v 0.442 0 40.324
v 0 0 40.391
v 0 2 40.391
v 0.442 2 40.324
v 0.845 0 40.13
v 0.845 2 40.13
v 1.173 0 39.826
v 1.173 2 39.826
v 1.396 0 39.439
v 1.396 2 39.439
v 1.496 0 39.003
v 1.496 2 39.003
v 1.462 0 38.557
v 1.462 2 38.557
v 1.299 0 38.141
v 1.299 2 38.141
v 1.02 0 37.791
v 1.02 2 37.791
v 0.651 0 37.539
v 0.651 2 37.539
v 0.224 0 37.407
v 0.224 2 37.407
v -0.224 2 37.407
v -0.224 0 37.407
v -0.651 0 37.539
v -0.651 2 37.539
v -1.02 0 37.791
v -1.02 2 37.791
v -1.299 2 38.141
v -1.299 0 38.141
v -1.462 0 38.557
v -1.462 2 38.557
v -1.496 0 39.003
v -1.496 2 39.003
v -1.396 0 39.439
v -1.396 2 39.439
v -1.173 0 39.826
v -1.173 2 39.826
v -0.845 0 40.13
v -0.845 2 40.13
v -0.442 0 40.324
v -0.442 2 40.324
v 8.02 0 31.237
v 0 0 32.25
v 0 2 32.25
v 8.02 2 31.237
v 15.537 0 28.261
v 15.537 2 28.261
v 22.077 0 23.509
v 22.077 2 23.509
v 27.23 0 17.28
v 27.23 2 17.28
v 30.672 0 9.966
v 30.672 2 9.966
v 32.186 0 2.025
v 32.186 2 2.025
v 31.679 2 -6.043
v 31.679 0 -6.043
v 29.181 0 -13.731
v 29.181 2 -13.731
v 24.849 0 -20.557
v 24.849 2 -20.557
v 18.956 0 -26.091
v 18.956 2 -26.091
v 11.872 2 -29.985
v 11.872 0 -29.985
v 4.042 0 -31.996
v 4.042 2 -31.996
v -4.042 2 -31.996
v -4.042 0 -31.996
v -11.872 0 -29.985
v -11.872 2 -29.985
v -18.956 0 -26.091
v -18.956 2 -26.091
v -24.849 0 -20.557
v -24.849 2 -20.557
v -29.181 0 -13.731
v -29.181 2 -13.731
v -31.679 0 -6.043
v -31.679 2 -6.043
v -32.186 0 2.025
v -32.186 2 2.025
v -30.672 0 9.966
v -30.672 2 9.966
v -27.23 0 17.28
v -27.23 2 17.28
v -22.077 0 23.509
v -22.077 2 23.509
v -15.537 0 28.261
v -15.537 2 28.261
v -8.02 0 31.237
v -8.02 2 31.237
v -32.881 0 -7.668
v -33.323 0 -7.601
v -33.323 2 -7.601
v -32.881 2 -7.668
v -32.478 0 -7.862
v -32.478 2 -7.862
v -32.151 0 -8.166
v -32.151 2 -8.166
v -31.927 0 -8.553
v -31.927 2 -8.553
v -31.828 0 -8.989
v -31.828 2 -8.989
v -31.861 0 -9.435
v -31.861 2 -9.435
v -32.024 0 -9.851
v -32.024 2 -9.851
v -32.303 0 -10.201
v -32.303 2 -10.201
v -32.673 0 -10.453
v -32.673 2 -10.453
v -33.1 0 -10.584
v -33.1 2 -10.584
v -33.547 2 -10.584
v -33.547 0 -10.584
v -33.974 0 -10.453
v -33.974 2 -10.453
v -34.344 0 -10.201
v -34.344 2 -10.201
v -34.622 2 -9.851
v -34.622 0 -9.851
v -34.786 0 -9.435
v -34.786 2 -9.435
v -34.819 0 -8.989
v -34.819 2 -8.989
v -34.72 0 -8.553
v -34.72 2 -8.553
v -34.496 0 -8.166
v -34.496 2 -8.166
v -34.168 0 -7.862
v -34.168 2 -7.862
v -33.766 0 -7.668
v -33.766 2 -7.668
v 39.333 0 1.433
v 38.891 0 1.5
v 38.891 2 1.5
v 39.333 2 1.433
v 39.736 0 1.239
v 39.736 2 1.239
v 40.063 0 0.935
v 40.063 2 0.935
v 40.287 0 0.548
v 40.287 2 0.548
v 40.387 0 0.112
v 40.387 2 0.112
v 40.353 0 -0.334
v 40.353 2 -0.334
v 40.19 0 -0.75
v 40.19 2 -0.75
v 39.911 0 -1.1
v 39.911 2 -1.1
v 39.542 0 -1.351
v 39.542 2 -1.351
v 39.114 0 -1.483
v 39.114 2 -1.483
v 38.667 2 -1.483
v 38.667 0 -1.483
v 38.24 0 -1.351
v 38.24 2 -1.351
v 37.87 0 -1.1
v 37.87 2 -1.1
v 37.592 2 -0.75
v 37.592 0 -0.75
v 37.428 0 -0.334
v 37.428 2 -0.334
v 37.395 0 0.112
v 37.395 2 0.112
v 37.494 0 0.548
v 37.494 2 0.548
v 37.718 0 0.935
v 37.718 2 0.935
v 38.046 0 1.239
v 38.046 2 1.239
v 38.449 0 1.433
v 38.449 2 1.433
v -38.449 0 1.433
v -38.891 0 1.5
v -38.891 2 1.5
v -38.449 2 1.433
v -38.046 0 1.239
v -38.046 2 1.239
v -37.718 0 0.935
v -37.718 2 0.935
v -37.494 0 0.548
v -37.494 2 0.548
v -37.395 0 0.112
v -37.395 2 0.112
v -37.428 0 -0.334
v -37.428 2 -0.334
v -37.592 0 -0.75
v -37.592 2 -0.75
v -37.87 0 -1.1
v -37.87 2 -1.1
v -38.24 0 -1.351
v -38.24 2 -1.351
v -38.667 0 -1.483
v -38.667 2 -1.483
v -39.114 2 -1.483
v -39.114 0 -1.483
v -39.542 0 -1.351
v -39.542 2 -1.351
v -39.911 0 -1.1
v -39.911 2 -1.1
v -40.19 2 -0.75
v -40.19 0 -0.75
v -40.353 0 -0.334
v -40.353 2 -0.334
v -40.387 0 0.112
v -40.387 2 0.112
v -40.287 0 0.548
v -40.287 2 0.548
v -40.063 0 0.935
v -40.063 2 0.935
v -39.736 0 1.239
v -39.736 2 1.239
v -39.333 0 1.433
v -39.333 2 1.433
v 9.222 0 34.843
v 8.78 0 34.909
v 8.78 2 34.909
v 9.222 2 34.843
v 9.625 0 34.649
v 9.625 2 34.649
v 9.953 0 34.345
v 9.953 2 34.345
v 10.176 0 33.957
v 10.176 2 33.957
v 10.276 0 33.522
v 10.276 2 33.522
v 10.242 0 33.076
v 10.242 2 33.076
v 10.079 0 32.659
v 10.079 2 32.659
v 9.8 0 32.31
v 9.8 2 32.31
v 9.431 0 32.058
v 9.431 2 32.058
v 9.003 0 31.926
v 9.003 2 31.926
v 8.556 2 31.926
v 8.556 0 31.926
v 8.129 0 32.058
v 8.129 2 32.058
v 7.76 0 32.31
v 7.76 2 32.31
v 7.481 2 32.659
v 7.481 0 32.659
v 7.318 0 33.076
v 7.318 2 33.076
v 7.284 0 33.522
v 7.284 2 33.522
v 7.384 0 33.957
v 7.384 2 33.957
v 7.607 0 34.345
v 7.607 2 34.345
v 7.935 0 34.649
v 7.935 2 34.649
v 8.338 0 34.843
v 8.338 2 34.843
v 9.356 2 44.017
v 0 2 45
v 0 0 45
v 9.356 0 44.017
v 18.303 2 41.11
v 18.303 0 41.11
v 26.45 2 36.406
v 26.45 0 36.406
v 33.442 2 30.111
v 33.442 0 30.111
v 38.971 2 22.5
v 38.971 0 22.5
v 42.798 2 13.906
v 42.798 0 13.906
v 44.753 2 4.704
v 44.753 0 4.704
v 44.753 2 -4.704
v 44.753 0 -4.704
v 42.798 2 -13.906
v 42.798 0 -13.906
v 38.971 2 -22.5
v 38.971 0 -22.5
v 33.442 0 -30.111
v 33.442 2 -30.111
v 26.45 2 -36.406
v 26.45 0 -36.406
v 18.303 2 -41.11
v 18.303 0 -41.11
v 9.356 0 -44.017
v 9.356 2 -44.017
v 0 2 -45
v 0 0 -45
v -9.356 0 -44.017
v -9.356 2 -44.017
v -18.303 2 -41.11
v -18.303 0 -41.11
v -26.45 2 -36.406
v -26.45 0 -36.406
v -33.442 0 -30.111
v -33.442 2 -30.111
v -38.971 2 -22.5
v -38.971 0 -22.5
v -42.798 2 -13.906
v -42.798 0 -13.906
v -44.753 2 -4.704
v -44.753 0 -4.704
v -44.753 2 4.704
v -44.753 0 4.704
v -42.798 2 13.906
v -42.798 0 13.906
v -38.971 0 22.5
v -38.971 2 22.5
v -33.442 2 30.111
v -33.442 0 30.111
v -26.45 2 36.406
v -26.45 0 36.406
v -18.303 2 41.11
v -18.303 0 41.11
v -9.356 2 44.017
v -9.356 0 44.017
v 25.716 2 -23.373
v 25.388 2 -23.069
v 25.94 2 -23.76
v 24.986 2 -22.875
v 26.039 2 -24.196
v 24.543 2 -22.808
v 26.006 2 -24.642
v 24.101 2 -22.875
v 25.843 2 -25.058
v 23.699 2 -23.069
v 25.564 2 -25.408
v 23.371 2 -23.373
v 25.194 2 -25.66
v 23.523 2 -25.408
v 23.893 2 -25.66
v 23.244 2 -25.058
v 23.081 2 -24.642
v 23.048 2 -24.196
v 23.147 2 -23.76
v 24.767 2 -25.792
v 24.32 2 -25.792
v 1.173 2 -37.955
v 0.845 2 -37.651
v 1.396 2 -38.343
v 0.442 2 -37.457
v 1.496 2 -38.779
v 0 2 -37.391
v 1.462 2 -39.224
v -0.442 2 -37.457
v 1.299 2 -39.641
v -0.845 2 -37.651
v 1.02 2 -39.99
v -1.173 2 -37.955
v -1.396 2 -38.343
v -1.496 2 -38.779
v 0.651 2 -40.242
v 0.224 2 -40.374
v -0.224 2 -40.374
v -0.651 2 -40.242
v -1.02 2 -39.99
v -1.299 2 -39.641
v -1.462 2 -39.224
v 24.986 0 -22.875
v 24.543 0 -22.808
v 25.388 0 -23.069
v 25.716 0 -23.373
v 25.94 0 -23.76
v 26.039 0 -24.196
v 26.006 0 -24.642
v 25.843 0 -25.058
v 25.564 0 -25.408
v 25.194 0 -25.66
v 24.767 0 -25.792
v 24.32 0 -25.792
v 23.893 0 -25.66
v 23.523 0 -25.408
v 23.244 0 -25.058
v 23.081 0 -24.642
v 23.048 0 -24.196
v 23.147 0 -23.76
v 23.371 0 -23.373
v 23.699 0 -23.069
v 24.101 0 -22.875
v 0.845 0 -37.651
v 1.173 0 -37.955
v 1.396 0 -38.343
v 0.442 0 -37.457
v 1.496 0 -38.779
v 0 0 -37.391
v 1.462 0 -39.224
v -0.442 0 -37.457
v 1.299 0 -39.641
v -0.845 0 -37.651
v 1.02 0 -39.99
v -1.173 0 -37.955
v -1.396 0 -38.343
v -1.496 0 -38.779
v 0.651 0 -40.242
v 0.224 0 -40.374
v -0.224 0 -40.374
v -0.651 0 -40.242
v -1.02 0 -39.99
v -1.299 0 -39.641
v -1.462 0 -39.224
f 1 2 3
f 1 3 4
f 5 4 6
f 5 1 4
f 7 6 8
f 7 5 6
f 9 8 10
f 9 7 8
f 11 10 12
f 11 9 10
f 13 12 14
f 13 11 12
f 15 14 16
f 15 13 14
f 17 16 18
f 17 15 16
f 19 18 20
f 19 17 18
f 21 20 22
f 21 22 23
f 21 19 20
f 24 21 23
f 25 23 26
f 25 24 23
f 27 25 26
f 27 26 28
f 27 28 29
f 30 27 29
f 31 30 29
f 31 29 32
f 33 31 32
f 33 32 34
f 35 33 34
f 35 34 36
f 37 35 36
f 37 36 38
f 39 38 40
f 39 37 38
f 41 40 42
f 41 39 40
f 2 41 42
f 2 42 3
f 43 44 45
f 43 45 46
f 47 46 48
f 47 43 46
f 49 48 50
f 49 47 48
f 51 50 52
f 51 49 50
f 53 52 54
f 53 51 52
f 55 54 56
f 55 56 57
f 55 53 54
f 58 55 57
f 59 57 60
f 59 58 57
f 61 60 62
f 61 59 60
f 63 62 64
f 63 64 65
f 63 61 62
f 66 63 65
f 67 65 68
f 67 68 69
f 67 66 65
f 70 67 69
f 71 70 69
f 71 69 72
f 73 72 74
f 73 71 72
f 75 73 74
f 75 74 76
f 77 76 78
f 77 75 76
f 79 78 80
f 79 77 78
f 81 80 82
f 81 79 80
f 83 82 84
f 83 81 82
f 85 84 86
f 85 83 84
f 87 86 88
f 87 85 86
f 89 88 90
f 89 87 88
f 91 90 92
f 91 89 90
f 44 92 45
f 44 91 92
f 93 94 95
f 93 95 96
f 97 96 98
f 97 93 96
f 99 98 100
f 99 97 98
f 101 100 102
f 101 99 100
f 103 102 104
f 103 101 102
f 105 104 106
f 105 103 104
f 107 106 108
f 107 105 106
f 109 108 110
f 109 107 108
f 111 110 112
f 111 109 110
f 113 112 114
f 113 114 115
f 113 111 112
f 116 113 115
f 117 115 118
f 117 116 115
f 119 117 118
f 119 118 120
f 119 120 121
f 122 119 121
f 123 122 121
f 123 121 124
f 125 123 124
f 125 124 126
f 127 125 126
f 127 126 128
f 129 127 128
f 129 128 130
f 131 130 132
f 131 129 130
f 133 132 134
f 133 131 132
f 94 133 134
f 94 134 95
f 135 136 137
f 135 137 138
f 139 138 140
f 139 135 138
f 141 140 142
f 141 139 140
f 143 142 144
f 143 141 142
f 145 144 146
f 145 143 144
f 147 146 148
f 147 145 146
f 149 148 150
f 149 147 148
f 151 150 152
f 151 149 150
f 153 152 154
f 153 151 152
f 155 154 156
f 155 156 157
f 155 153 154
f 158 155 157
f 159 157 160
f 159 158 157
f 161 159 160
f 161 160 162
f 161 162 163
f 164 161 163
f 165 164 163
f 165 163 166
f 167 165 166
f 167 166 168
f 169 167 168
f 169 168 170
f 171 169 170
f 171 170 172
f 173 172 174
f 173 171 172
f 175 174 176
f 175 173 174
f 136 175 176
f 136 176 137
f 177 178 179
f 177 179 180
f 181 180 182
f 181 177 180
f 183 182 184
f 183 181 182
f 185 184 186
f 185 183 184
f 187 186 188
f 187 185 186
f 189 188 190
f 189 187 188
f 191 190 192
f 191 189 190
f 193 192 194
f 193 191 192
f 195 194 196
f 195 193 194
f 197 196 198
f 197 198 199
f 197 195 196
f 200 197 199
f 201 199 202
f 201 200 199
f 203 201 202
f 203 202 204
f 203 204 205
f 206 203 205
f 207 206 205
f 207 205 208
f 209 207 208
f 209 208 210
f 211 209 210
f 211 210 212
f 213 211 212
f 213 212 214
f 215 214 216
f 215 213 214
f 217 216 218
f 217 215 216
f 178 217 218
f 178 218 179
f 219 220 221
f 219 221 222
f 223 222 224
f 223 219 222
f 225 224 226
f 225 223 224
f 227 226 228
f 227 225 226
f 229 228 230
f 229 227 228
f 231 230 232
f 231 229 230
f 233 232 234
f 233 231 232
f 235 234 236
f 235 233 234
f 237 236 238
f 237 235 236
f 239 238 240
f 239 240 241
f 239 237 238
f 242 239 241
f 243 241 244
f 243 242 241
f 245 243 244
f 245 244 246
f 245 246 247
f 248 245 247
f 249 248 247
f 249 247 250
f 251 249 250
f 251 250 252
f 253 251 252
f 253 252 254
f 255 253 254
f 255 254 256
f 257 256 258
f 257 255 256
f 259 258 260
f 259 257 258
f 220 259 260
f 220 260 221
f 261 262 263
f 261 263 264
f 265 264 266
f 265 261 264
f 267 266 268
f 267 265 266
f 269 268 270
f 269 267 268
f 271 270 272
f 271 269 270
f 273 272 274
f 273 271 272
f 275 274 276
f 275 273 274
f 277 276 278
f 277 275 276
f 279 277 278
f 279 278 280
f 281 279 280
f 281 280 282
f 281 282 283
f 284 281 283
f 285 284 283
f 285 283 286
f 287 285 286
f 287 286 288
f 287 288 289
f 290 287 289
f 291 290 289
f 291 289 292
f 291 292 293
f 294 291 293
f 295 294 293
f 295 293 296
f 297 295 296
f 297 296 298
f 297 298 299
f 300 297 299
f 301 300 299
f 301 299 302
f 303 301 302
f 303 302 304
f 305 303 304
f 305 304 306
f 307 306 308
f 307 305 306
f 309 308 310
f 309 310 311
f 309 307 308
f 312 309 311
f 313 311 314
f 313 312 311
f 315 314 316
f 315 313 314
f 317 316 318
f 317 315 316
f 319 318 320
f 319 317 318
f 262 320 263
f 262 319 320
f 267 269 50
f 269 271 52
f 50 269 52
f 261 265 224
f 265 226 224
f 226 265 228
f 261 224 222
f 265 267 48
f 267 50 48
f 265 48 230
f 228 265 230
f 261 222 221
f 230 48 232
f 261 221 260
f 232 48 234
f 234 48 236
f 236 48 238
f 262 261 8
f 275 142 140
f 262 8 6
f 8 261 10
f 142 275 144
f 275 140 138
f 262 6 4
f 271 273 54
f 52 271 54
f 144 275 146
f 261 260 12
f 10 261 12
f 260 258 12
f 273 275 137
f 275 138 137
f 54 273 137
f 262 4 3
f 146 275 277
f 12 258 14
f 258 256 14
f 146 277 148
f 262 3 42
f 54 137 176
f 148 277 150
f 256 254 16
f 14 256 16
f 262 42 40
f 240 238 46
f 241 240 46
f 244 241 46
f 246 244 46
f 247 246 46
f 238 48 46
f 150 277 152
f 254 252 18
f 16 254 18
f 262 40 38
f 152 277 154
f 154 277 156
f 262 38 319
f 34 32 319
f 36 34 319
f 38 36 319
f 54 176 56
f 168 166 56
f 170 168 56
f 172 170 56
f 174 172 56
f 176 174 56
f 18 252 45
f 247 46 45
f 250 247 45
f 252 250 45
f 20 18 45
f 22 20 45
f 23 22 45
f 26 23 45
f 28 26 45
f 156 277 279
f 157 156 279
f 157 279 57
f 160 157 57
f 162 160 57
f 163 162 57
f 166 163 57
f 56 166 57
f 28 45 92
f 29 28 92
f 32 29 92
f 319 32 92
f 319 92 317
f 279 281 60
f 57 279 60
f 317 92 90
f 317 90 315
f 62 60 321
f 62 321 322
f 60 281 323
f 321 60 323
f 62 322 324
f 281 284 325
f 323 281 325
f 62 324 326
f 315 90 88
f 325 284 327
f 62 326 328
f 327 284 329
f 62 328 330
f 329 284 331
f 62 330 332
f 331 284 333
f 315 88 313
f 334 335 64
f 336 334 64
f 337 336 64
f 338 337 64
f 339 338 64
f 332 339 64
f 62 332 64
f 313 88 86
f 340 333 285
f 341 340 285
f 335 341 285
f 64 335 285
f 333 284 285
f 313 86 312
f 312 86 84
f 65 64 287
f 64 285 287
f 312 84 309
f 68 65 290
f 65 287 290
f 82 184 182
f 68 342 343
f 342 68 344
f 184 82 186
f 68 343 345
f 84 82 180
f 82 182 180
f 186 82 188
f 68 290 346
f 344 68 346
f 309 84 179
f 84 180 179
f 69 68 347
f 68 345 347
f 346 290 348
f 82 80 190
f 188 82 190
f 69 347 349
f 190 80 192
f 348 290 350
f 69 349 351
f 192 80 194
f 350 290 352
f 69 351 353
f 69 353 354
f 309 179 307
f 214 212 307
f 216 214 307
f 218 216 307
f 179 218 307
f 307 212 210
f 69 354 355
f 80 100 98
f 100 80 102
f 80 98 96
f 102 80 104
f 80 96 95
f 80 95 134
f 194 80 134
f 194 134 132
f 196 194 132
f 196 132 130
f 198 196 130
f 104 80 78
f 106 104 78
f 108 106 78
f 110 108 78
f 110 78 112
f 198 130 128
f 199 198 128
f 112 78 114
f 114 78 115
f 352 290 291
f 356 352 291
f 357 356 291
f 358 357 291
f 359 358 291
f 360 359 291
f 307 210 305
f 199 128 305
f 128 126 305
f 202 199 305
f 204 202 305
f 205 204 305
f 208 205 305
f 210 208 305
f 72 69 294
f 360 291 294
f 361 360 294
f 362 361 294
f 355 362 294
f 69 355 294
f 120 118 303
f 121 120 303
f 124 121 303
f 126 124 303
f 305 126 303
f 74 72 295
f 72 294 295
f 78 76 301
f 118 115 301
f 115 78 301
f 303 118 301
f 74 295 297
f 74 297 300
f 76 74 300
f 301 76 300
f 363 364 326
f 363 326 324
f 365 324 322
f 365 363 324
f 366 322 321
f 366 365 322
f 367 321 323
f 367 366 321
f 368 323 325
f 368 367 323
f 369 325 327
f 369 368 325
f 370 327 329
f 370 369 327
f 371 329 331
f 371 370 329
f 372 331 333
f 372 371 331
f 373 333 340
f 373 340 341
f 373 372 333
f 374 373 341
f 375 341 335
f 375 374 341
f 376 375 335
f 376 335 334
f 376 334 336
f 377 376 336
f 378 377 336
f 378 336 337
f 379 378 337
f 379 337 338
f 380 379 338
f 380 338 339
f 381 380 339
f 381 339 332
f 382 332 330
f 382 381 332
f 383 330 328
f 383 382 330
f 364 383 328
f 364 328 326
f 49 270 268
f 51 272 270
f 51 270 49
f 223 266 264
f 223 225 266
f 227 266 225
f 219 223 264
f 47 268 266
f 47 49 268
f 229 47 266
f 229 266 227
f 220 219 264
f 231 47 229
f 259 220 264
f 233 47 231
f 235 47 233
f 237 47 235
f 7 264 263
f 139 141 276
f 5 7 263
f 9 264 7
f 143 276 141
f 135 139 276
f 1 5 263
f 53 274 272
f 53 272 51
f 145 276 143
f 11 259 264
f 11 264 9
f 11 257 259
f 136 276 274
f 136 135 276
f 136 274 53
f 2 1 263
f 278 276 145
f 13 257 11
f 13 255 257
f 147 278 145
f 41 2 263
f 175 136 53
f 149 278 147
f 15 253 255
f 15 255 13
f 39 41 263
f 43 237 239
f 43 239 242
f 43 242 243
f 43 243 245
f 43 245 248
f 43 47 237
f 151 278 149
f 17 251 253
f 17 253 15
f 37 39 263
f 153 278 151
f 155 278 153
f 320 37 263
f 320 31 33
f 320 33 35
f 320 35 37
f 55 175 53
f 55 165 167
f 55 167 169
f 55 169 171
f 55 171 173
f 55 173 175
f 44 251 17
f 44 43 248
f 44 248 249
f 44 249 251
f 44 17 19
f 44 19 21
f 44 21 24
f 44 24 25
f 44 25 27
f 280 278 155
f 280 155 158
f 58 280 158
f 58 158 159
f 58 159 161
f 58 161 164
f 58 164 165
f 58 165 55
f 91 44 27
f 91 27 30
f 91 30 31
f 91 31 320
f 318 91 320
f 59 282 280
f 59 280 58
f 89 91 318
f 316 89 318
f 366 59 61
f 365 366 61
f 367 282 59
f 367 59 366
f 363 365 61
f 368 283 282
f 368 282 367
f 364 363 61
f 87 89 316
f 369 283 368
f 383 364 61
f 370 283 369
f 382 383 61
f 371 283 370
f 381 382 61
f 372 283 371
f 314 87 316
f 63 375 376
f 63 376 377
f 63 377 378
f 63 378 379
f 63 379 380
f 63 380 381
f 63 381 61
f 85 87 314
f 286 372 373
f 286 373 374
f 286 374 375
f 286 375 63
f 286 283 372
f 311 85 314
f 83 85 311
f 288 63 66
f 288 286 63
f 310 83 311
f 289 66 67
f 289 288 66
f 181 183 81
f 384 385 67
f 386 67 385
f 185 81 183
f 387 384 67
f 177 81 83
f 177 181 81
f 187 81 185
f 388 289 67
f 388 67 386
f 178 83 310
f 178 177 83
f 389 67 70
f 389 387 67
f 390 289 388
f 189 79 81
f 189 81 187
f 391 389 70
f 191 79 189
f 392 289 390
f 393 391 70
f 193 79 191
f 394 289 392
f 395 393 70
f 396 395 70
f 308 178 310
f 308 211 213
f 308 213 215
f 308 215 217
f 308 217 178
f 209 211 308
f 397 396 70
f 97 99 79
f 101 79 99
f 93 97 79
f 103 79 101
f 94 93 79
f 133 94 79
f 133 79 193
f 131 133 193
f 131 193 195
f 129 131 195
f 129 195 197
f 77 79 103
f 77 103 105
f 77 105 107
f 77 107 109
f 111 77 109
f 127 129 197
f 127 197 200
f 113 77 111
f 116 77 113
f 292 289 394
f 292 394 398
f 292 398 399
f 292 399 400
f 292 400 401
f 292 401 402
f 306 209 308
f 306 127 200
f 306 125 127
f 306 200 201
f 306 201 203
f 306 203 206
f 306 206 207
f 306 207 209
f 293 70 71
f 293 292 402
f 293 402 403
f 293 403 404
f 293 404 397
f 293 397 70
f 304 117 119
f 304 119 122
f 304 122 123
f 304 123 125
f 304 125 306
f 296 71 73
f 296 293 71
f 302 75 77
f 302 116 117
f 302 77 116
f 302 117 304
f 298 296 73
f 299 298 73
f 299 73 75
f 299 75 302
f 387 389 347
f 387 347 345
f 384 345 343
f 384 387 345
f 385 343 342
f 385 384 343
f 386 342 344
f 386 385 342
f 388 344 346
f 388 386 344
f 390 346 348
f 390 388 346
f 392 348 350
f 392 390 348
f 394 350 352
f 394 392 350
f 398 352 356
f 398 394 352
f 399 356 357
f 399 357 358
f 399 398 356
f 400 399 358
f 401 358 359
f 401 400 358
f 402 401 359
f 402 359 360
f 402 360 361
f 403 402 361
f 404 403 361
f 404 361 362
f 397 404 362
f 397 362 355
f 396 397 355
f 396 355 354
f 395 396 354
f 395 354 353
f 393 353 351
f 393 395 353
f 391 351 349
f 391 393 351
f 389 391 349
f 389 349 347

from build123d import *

# Parameters (mm, degrees)
SKETCH2_R           = 1.5
SKETCH2_R_2         = 32.25
BOSS_EXTRUDE1_DEPTH = 2
SKETCH3_R           = 45
CUT_EXTRUDE1_DEPTH  = 74.566296631


with BuildPart() as part:
    # Sketch2 → Boss-Extrude1 (new body)
    with BuildSketch(Plane(origin=(0, 0, 0), x_dir=(1, 0, 0), z_dir=(0, 1, 0))):
        with BuildLine():
            Line((17.897079586, 48.929734976), (40.149284407, 43.651218265))
            ThreePointArc((40.149284407, 43.651218265), (42.540265174, 42.312242187), (43.866371506, 39.91409958))
            Line((43.866371506, 39.91409958), (49.02521675, 17.633846579))
            ThreePointArc((49.02521675, 17.633846579), (49.23478351, 16.809026698), (49.479249782, 15.993868858))
            ThreePointArc((49.479249782, 15.993868858), (51.999812242, -0.139738387), (49.392575566, -16.259565766))
            ThreePointArc((49.392575566, -16.259565766), (49.143731732, -17.073397941), (48.929734976, -17.897079586))
            Line((48.929734976, -17.897079586), (43.651218265, -40.149284407))
            ThreePointArc((43.651218265, -40.149284407), (42.312242187, -42.540265174), (39.91409958, -43.866371506))
            Line((39.91409958, -43.866371506), (17.633846579, -49.02521675))
            ThreePointArc((17.633846579, -49.02521675), (16.809026698, -49.23478351), (15.993868858, -49.479249782))
            ThreePointArc((15.993868858, -49.479249782), (-0.139738387, -51.999812242), (-16.259565766, -49.392575566))
            ThreePointArc((-16.259565766, -49.392575566), (-17.073397941, -49.143731732), (-17.897079586, -48.929734976))
            Line((-17.897079586, -48.929734976), (-40.149284407, -43.651218265))
            ThreePointArc((-40.149284407, -43.651218265), (-42.540265174, -42.312242187), (-43.866371506, -39.91409958))
            Line((-43.866371506, -39.91409958), (-49.02521675, -17.633846579))
            ThreePointArc((-49.02521675, -17.633846579), (-49.23478351, -16.809026698), (-49.479249782, -15.993868858))
            ThreePointArc((-49.479249782, -15.993868858), (-51.999812242, 0.139738387), (-49.392575566, 16.259565766))
            ThreePointArc((-49.392575566, 16.259565766), (-49.143731732, 17.073397941), (-48.929734976, 17.897079586))
            Line((-48.929734976, 17.897079586), (-43.651218265, 40.149284407))
            ThreePointArc((-43.651218265, 40.149284407), (-42.312242187, 42.540265174), (-39.91409958, 43.866371506))
            Line((-39.91409958, 43.866371506), (-17.633846579, 49.02521675))
            ThreePointArc((-17.633846579, 49.02521675), (-16.809026698, 49.23478351), (-15.993868858, 49.479249782))
            ThreePointArc((-15.993868858, 49.479249782), (-8.026622704, 51.3767781), (0.139738387, 51.999812242))
            ThreePointArc((0.139738387, 51.999812242), (8.302633013, 51.332896714), (16.259565766, 49.392575566))
            ThreePointArc((16.259565766, 49.392575566), (17.073397941, 49.143731732), (17.897079586, 48.929734976))
        make_face()
        with Locations(Location((-38.8907, 38.8907, 0), (0, 0, 270))):
            Circle(SKETCH2_R, mode=Mode.SUBTRACT)
        with Locations(Location((38.8907, 38.8907, 0), (0, 0, 90))):
            Circle(SKETCH2_R, mode=Mode.SUBTRACT)
        with Locations(Location((38.8907, -38.8907, 0), (0, 0, 270))):
            Circle(SKETCH2_R, mode=Mode.SUBTRACT)
        with Locations(Location((-38.8907, -38.8907, 0), (0, 0, 90))):
            Circle(SKETCH2_R, mode=Mode.SUBTRACT)
        with Locations(Location((-33.323403491, 9.101105168, 0), (0, 0, 270))):
            Circle(SKETCH2_R, mode=Mode.SUBTRACT)
        with Locations(Location((24.543490023, 24.30836138, 0), (0, 0, 270))):
            Circle(SKETCH2_R, mode=Mode.SUBTRACT)
        with Locations(Location((8.779913467, -33.409466548, 0), (0, 0, 270))):
            Circle(SKETCH2_R, mode=Mode.SUBTRACT)
        with Locations(Location((0, 0, 0), (0, 0, 270))):
            Circle(SKETCH2_R_2, mode=Mode.SUBTRACT)
        with Locations(Location((0, 38.8907, 0), (0, 0, 270))):
            Circle(SKETCH2_R, mode=Mode.SUBTRACT)
        with Locations(Location((38.8907, 0, 0), (0, 0, 270))):
            Circle(SKETCH2_R, mode=Mode.SUBTRACT)
        with Locations(Location((0, -38.8907, 0), (0, 0, 270))):
            Circle(SKETCH2_R, mode=Mode.SUBTRACT)
        with Locations(Location((-38.8907, 0, 0), (0, 0, 270))):
            Circle(SKETCH2_R, mode=Mode.SUBTRACT)
    extrude(amount=BOSS_EXTRUDE1_DEPTH)

    # Sketch3 → Cut-Extrude1 (cut, through all)
    with BuildSketch(Plane(origin=(0, 2, 0), x_dir=(1, 0, 0), z_dir=(0, 1, 0))):
        with BuildLine():
            Line((-43.651218265, 40.149284407), (-48.929734976, 17.897079586))
            ThreePointArc((-48.929734976, 17.897079586), (-49.143731732, 17.073397941), (-49.392575566, 16.259565766))
            ThreePointArc((-49.392575566, 16.259565766), (-51.999812242, 0.139738387), (-49.479249782, -15.993868858))
            ThreePointArc((-49.479249782, -15.993868858), (-49.23478351, -16.809026698), (-49.02521675, -17.633846579))
            Line((-49.02521675, -17.633846579), (-43.866371506, -39.91409958))
            ThreePointArc((-43.866371506, -39.91409958), (-42.540265174, -42.312242187), (-40.149284407, -43.651218265))
            Line((-40.149284407, -43.651218265), (-17.897079586, -48.929734976))
            ThreePointArc((-17.897079586, -48.929734976), (-17.073397941, -49.143731732), (-16.259565766, -49.392575566))
            ThreePointArc((-16.259565766, -49.392575566), (-0.139738387, -51.999812242), (15.993868858, -49.479249782))
            ThreePointArc((15.993868858, -49.479249782), (16.809026698, -49.23478351), (17.633846579, -49.02521675))
            Line((17.633846579, -49.02521675), (39.91409958, -43.866371506))
            ThreePointArc((39.91409958, -43.866371506), (42.312242187, -42.540265174), (43.651218265, -40.149284407))
            Line((43.651218265, -40.149284407), (48.929734976, -17.897079586))
            ThreePointArc((48.929734976, -17.897079586), (49.143731732, -17.073397941), (49.392575566, -16.259565766))
            ThreePointArc((49.392575566, -16.259565766), (51.999812242, -0.139738387), (49.479249782, 15.993868858))
            ThreePointArc((49.479249782, 15.993868858), (49.23478351, 16.809026698), (49.02521675, 17.633846579))
            Line((49.02521675, 17.633846579), (43.866371506, 39.91409958))
            ThreePointArc((43.866371506, 39.91409958), (42.540265174, 42.312242187), (40.149284407, 43.651218265))
            Line((40.149284407, 43.651218265), (17.897079586, 48.929734976))
            ThreePointArc((17.897079586, 48.929734976), (17.073397941, 49.143731732), (16.259565766, 49.392575566))
            ThreePointArc((16.259565766, 49.392575566), (0.139738387, 51.999812242), (-15.993868858, 49.479249782))
            ThreePointArc((-15.993868858, 49.479249782), (-16.809026698, 49.23478351), (-17.633846579, 49.02521675))
            Line((-17.633846579, 49.02521675), (-39.91409958, 43.866371506))
            ThreePointArc((-39.91409958, 43.866371506), (-42.312242187, 42.540265174), (-43.651218265, 40.149284407))
        make_face()
        with Locations(Location((0, 0, 0), (0, 0, 270))):
            Circle(SKETCH3_R, mode=Mode.SUBTRACT)
    extrude(amount=-CUT_EXTRUDE1_DEPTH, mode=Mode.SUBTRACT)


solid = part.part
